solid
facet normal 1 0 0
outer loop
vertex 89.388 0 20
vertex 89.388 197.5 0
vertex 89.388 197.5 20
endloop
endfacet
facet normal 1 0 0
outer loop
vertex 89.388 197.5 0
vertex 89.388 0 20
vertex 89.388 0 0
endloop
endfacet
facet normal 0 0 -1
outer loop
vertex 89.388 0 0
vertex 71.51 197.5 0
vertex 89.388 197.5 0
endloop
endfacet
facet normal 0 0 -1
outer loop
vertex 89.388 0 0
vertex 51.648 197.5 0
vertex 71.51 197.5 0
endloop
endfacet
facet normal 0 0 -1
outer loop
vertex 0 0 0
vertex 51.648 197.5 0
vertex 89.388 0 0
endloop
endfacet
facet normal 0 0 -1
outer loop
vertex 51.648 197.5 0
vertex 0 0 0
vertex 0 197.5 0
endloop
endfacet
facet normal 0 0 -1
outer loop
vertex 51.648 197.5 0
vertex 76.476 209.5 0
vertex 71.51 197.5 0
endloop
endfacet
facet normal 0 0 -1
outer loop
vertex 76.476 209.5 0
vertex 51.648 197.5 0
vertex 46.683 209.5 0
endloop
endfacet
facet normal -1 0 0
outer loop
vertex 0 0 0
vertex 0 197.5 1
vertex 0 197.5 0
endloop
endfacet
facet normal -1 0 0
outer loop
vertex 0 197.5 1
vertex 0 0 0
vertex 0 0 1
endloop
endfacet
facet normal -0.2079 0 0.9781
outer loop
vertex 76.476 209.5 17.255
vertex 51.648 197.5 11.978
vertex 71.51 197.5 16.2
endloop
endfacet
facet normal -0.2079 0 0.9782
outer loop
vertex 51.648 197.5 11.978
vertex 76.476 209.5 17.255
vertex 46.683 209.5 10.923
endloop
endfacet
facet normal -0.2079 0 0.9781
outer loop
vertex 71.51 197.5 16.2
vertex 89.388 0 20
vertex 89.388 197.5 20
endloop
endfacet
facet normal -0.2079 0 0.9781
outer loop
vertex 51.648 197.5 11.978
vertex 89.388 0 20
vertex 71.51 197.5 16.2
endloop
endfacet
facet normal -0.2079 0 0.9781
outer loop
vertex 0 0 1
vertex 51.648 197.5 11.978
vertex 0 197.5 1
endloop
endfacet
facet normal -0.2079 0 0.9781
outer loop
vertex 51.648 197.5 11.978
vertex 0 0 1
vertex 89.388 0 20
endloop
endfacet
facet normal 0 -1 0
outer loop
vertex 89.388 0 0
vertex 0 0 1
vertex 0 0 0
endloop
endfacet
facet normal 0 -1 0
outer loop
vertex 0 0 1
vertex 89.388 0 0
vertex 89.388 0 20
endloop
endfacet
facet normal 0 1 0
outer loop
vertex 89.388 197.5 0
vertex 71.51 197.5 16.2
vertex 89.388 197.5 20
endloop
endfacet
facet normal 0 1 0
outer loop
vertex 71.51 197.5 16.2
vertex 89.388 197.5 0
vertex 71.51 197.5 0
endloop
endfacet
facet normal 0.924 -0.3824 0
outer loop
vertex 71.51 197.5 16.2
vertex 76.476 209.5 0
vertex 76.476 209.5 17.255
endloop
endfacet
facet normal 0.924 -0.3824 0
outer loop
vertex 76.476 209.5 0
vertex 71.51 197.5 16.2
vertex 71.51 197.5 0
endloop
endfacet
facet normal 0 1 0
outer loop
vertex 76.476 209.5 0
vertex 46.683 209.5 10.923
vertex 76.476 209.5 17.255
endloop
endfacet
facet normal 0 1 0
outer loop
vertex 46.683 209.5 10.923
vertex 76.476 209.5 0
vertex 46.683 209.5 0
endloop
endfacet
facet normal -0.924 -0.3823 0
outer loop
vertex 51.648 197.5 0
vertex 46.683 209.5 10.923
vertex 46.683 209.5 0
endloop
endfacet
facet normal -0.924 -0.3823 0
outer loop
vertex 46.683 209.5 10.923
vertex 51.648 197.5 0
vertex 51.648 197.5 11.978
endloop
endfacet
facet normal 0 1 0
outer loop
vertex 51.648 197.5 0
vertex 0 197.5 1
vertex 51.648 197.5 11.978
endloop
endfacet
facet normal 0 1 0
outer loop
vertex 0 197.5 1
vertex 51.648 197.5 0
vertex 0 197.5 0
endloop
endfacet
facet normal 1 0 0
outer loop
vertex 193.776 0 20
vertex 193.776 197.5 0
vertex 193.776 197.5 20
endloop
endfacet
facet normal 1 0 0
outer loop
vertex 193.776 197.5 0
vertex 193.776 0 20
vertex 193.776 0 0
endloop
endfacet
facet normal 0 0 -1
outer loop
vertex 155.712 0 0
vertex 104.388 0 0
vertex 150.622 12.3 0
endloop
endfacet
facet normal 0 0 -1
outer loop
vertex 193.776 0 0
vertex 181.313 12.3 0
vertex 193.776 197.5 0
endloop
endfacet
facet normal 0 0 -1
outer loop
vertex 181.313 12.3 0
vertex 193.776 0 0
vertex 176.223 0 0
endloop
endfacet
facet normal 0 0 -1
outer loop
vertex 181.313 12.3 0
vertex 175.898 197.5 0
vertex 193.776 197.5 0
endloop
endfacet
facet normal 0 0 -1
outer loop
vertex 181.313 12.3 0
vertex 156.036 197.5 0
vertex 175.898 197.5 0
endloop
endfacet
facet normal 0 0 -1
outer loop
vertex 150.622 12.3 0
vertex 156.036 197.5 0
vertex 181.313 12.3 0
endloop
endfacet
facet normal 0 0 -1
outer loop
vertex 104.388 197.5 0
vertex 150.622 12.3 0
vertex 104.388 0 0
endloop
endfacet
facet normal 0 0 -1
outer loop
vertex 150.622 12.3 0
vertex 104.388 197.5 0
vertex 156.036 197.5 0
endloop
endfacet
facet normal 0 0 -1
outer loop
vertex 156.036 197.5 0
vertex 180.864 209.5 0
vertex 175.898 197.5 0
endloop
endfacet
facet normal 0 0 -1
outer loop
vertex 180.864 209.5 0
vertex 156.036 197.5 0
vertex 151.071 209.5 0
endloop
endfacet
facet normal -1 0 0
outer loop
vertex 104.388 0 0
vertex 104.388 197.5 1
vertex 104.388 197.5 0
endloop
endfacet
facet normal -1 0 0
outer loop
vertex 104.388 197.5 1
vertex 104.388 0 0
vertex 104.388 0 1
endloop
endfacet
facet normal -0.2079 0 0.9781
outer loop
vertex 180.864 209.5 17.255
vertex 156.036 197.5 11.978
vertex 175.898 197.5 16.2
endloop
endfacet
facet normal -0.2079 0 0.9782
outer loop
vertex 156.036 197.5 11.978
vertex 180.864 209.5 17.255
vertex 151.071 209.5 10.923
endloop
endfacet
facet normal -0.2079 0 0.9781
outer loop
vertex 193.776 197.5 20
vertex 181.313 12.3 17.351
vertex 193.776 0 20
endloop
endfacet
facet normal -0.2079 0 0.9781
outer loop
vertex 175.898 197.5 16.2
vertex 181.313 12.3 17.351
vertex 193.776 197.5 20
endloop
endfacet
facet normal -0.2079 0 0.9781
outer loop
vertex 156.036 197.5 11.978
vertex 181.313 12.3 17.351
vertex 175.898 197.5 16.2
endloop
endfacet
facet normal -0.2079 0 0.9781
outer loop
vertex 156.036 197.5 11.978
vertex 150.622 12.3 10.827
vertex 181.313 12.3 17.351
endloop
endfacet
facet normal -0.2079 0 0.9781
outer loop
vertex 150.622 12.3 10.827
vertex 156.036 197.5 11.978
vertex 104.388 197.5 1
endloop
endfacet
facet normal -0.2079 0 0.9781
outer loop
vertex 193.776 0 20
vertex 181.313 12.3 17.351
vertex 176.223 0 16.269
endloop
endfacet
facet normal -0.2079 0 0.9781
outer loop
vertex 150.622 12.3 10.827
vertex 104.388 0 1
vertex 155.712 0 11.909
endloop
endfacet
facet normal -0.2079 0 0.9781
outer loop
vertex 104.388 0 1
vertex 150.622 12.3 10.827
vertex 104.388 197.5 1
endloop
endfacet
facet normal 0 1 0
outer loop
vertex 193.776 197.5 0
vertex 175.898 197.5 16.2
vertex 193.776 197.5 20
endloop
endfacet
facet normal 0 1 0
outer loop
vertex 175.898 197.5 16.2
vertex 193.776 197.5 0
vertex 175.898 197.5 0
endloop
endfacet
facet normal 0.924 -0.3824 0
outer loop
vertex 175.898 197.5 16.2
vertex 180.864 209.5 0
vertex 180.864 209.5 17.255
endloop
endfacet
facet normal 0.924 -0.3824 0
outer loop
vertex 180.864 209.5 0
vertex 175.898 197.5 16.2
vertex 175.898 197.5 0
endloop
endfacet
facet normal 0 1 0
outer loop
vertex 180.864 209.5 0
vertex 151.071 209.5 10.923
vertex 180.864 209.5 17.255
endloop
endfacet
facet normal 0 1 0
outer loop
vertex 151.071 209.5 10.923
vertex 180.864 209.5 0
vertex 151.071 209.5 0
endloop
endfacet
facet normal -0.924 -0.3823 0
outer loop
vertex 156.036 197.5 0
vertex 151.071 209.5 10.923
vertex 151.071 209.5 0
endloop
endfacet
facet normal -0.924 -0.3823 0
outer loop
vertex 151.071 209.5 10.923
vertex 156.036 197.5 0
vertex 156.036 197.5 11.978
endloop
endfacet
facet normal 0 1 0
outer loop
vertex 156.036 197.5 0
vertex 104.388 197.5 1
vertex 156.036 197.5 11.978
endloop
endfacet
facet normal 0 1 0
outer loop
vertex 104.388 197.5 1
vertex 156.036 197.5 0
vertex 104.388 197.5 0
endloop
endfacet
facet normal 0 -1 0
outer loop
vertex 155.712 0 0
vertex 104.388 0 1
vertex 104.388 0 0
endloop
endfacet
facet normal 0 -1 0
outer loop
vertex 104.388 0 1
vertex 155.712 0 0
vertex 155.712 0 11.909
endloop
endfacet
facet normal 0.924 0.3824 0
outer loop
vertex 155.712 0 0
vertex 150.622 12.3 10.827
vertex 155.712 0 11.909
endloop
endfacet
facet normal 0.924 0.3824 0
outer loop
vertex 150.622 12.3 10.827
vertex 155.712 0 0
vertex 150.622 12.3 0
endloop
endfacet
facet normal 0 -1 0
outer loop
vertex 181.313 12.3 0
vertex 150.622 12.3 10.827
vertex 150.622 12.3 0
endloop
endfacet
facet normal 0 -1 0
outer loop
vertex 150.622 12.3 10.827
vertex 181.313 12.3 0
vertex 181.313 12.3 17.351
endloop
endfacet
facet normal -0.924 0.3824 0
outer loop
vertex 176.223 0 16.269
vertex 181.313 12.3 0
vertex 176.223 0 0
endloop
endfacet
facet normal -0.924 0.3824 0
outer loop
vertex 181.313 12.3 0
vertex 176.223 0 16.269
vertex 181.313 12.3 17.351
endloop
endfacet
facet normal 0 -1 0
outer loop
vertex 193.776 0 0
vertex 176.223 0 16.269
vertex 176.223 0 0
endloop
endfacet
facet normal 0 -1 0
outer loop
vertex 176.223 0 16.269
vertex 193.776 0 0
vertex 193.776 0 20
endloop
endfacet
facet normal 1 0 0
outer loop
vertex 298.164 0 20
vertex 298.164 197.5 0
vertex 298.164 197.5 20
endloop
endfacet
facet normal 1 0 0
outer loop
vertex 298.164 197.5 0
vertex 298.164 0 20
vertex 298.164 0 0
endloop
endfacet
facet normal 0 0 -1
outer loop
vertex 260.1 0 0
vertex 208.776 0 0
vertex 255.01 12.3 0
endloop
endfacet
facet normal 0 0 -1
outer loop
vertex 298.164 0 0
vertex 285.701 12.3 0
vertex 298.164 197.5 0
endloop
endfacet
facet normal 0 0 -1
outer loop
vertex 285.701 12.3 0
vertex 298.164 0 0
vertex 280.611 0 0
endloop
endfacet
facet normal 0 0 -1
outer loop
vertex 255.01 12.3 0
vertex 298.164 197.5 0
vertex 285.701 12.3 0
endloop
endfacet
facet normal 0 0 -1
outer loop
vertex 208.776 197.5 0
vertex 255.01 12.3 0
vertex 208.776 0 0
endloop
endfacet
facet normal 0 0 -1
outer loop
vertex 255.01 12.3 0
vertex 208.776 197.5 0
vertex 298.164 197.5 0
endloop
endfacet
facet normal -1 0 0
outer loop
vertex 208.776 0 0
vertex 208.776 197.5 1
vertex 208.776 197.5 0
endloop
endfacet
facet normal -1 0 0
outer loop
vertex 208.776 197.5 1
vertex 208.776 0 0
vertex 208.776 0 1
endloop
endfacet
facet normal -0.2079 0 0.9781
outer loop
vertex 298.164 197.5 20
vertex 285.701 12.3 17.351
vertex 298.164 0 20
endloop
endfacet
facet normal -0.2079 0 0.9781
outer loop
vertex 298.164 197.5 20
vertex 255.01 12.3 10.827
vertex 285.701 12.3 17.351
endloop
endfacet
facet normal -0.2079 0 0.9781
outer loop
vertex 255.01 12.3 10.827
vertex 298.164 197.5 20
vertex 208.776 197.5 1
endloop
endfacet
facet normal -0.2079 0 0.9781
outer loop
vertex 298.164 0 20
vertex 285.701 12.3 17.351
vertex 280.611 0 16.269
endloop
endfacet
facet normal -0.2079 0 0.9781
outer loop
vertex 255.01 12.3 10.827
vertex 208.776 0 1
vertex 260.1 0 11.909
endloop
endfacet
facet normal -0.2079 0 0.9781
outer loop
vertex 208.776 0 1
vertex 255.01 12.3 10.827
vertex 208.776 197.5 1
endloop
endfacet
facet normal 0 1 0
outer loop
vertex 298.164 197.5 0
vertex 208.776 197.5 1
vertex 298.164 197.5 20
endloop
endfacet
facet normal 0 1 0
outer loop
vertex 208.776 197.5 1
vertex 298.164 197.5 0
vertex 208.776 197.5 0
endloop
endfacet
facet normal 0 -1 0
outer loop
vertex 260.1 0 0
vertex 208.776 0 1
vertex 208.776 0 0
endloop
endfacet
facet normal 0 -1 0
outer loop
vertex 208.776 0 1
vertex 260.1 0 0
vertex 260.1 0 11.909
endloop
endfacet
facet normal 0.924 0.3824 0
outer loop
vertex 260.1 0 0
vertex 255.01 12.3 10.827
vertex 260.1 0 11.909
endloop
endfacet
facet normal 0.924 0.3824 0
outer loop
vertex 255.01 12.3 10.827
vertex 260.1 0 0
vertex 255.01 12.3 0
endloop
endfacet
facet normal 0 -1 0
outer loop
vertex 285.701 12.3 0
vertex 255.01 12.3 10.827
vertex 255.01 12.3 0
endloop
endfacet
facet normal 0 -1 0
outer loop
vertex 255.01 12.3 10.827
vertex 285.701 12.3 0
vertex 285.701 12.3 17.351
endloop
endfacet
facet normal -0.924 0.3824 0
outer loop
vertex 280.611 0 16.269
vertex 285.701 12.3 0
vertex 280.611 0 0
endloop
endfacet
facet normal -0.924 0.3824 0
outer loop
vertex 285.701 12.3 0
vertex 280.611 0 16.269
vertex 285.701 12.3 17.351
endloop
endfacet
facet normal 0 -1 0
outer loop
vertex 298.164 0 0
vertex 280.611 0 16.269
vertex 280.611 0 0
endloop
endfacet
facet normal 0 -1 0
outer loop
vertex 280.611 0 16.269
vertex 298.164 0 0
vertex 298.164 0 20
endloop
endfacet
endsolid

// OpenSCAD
// Türschwellenrampe für Saugroboter – anpassbar (OpenSCAD-Customizer)
// Autor: Stefan J. Kaiser DM5CQ / OE8KKS
// Lizenz: CC BY-NC-SA 4.0 (siehe LICENSE.md)
//
// In OpenSCAD: Fenster > Customizer einblenden, Werte eintragen, "teil" wählen,
// F6 (Rendern) und Datei > Exportieren > STL. Für jeden Teiltyp einmal exportieren.
// Die Stückliste (Anzahl und Breite der Segmente) steht in der Konsole.

/* [Tür und Schwelle] */
// Gesamtbreite der Rampe = lichte Türbreite (mm)
gesamtbreite = 790; // [100:1:2500]
// Höhe der Schwelle (mm)
schwellenhoehe = 20; // [5:0.5:60]

/* [Rampe] */
// Steigungswinkel in Grad (die meisten Roboter schaffen 12–15°)
steigung = 12; // [5:0.5:20]
// Rampenlänge (mm); 0 = aus Höhe und Steigung berechnen
tiefe_manuell = 0; // [0:1:400]
// Dicke der vorderen Auflaufkante (mm)
vorderkante = 1; // [0.4:0.1:3]

/* [Drucker und Steckverbindung] */
// Größte Segmentbreite – an das Druckbett anpassen (mm)
max_segmentbreite = 200; // [60:1:400]
// Länge des Schwalbenschwanzes (mm)
zapfen_laenge = 12; // [6:0.5:25]
// Spiel je Flanke zwischen Zapfen und Nut (mm)
spiel = 0.3; // [0.1:0.05:0.6]

/* [Ausgabe] */
// Welches Teil soll erzeugt werden?
teil = "alle"; // [alle:Alle Teile nebeneinander, anfang:Anfangsteil (nur Zapfen), mitte:Mittelteil (Nut + Zapfen), ende:Endteil (nur Nut), einzel:Einzelteil (ohne Verbindung)]

/* [Hidden] */
$fn = 32;
tiefe  = tiefe_manuell > 0 ? tiefe_manuell : (schwellenhoehe - vorderkante) / tan(steigung);
anzahl = max(1, ceil(gesamtbreite / max_segmentbreite - 1e-9));
seg    = gesamtbreite / anzahl;
// Schwalbenschwanz im hinteren, dicken Teil der Rampe (bewährt bei 90 mm Tiefe: Wurzel 52–72, Spitze 47–77 mm)
xc = 0.6889 * tiefe;
r1 = xc - 0.2222 * tiefe / 2;  r2 = xc + 0.2222 * tiefe / 2;   // Wurzel
t1 = xc - 0.3333 * tiefe / 2;  t2 = xc + 0.3333 * tiefe / 2;   // Spitze
k  = (r1 - t1) / zapfen_laenge;                                  // Flankenneigung je mm

echo(str("Stückliste: ", anzahl, " Segmente à ", seg, " mm – Rampe ", tiefe, " mm tief, ",
         atan((schwellenhoehe - vorderkante) / tiefe), " Grad"));
if (anzahl == 1) echo("Drucken: 1 x Einzelteil");
else echo(str("Drucken: 1 x Anfangsteil, ", anzahl - 2, " x Mittelteil, 1 x Endteil"));

// Keil: Querschnitt der Rampe, entlang y (Breite) beliebig lang
module keil() {
    translate([0, 5000, 0]) rotate([90, 0, 0])
        linear_extrude(10000)
            polygon([[0, 0], [tiefe, 0], [tiefe, schwellenhoehe], [0, vorderkante]]);
}

module zapfen_2d() {
    polygon([[r1, 0], [r2, 0], [t2, zapfen_laenge], [t1, zapfen_laenge]]);
}

module nut_2d() {
    // Flanken nach unten verlängert, damit an der Teilekante kein Grat stehen bleibt
    offset(delta = spiel)
        polygon([[r1 + k, -1], [r2 - k, -1], [t2, zapfen_laenge], [t1, zapfen_laenge]]);
}

module grundriss(nut, zapfen) {
    difference() {
        union() {
            square([tiefe, seg]);
            if (zapfen) translate([0, seg]) zapfen_2d();
        }
        if (nut) nut_2d();
    }
}

module segment(nut, zapfen) {
    intersection() {
        keil();
        linear_extrude(schwellenhoehe + 1) grundriss(nut, zapfen);
    }
}

abstand = tiefe + 15;
if (teil == "anfang")      segment(false, true);
else if (teil == "mitte")  segment(true, true);
else if (teil == "ende")   segment(true, false);
else if (teil == "einzel") segment(false, false);
else {
    if (anzahl == 1) segment(false, false);
    else {
        segment(false, true);
        translate([abstand, 0, 0]) segment(true, true);
        translate([2 * abstand, 0, 0]) segment(true, false);
    }
}
